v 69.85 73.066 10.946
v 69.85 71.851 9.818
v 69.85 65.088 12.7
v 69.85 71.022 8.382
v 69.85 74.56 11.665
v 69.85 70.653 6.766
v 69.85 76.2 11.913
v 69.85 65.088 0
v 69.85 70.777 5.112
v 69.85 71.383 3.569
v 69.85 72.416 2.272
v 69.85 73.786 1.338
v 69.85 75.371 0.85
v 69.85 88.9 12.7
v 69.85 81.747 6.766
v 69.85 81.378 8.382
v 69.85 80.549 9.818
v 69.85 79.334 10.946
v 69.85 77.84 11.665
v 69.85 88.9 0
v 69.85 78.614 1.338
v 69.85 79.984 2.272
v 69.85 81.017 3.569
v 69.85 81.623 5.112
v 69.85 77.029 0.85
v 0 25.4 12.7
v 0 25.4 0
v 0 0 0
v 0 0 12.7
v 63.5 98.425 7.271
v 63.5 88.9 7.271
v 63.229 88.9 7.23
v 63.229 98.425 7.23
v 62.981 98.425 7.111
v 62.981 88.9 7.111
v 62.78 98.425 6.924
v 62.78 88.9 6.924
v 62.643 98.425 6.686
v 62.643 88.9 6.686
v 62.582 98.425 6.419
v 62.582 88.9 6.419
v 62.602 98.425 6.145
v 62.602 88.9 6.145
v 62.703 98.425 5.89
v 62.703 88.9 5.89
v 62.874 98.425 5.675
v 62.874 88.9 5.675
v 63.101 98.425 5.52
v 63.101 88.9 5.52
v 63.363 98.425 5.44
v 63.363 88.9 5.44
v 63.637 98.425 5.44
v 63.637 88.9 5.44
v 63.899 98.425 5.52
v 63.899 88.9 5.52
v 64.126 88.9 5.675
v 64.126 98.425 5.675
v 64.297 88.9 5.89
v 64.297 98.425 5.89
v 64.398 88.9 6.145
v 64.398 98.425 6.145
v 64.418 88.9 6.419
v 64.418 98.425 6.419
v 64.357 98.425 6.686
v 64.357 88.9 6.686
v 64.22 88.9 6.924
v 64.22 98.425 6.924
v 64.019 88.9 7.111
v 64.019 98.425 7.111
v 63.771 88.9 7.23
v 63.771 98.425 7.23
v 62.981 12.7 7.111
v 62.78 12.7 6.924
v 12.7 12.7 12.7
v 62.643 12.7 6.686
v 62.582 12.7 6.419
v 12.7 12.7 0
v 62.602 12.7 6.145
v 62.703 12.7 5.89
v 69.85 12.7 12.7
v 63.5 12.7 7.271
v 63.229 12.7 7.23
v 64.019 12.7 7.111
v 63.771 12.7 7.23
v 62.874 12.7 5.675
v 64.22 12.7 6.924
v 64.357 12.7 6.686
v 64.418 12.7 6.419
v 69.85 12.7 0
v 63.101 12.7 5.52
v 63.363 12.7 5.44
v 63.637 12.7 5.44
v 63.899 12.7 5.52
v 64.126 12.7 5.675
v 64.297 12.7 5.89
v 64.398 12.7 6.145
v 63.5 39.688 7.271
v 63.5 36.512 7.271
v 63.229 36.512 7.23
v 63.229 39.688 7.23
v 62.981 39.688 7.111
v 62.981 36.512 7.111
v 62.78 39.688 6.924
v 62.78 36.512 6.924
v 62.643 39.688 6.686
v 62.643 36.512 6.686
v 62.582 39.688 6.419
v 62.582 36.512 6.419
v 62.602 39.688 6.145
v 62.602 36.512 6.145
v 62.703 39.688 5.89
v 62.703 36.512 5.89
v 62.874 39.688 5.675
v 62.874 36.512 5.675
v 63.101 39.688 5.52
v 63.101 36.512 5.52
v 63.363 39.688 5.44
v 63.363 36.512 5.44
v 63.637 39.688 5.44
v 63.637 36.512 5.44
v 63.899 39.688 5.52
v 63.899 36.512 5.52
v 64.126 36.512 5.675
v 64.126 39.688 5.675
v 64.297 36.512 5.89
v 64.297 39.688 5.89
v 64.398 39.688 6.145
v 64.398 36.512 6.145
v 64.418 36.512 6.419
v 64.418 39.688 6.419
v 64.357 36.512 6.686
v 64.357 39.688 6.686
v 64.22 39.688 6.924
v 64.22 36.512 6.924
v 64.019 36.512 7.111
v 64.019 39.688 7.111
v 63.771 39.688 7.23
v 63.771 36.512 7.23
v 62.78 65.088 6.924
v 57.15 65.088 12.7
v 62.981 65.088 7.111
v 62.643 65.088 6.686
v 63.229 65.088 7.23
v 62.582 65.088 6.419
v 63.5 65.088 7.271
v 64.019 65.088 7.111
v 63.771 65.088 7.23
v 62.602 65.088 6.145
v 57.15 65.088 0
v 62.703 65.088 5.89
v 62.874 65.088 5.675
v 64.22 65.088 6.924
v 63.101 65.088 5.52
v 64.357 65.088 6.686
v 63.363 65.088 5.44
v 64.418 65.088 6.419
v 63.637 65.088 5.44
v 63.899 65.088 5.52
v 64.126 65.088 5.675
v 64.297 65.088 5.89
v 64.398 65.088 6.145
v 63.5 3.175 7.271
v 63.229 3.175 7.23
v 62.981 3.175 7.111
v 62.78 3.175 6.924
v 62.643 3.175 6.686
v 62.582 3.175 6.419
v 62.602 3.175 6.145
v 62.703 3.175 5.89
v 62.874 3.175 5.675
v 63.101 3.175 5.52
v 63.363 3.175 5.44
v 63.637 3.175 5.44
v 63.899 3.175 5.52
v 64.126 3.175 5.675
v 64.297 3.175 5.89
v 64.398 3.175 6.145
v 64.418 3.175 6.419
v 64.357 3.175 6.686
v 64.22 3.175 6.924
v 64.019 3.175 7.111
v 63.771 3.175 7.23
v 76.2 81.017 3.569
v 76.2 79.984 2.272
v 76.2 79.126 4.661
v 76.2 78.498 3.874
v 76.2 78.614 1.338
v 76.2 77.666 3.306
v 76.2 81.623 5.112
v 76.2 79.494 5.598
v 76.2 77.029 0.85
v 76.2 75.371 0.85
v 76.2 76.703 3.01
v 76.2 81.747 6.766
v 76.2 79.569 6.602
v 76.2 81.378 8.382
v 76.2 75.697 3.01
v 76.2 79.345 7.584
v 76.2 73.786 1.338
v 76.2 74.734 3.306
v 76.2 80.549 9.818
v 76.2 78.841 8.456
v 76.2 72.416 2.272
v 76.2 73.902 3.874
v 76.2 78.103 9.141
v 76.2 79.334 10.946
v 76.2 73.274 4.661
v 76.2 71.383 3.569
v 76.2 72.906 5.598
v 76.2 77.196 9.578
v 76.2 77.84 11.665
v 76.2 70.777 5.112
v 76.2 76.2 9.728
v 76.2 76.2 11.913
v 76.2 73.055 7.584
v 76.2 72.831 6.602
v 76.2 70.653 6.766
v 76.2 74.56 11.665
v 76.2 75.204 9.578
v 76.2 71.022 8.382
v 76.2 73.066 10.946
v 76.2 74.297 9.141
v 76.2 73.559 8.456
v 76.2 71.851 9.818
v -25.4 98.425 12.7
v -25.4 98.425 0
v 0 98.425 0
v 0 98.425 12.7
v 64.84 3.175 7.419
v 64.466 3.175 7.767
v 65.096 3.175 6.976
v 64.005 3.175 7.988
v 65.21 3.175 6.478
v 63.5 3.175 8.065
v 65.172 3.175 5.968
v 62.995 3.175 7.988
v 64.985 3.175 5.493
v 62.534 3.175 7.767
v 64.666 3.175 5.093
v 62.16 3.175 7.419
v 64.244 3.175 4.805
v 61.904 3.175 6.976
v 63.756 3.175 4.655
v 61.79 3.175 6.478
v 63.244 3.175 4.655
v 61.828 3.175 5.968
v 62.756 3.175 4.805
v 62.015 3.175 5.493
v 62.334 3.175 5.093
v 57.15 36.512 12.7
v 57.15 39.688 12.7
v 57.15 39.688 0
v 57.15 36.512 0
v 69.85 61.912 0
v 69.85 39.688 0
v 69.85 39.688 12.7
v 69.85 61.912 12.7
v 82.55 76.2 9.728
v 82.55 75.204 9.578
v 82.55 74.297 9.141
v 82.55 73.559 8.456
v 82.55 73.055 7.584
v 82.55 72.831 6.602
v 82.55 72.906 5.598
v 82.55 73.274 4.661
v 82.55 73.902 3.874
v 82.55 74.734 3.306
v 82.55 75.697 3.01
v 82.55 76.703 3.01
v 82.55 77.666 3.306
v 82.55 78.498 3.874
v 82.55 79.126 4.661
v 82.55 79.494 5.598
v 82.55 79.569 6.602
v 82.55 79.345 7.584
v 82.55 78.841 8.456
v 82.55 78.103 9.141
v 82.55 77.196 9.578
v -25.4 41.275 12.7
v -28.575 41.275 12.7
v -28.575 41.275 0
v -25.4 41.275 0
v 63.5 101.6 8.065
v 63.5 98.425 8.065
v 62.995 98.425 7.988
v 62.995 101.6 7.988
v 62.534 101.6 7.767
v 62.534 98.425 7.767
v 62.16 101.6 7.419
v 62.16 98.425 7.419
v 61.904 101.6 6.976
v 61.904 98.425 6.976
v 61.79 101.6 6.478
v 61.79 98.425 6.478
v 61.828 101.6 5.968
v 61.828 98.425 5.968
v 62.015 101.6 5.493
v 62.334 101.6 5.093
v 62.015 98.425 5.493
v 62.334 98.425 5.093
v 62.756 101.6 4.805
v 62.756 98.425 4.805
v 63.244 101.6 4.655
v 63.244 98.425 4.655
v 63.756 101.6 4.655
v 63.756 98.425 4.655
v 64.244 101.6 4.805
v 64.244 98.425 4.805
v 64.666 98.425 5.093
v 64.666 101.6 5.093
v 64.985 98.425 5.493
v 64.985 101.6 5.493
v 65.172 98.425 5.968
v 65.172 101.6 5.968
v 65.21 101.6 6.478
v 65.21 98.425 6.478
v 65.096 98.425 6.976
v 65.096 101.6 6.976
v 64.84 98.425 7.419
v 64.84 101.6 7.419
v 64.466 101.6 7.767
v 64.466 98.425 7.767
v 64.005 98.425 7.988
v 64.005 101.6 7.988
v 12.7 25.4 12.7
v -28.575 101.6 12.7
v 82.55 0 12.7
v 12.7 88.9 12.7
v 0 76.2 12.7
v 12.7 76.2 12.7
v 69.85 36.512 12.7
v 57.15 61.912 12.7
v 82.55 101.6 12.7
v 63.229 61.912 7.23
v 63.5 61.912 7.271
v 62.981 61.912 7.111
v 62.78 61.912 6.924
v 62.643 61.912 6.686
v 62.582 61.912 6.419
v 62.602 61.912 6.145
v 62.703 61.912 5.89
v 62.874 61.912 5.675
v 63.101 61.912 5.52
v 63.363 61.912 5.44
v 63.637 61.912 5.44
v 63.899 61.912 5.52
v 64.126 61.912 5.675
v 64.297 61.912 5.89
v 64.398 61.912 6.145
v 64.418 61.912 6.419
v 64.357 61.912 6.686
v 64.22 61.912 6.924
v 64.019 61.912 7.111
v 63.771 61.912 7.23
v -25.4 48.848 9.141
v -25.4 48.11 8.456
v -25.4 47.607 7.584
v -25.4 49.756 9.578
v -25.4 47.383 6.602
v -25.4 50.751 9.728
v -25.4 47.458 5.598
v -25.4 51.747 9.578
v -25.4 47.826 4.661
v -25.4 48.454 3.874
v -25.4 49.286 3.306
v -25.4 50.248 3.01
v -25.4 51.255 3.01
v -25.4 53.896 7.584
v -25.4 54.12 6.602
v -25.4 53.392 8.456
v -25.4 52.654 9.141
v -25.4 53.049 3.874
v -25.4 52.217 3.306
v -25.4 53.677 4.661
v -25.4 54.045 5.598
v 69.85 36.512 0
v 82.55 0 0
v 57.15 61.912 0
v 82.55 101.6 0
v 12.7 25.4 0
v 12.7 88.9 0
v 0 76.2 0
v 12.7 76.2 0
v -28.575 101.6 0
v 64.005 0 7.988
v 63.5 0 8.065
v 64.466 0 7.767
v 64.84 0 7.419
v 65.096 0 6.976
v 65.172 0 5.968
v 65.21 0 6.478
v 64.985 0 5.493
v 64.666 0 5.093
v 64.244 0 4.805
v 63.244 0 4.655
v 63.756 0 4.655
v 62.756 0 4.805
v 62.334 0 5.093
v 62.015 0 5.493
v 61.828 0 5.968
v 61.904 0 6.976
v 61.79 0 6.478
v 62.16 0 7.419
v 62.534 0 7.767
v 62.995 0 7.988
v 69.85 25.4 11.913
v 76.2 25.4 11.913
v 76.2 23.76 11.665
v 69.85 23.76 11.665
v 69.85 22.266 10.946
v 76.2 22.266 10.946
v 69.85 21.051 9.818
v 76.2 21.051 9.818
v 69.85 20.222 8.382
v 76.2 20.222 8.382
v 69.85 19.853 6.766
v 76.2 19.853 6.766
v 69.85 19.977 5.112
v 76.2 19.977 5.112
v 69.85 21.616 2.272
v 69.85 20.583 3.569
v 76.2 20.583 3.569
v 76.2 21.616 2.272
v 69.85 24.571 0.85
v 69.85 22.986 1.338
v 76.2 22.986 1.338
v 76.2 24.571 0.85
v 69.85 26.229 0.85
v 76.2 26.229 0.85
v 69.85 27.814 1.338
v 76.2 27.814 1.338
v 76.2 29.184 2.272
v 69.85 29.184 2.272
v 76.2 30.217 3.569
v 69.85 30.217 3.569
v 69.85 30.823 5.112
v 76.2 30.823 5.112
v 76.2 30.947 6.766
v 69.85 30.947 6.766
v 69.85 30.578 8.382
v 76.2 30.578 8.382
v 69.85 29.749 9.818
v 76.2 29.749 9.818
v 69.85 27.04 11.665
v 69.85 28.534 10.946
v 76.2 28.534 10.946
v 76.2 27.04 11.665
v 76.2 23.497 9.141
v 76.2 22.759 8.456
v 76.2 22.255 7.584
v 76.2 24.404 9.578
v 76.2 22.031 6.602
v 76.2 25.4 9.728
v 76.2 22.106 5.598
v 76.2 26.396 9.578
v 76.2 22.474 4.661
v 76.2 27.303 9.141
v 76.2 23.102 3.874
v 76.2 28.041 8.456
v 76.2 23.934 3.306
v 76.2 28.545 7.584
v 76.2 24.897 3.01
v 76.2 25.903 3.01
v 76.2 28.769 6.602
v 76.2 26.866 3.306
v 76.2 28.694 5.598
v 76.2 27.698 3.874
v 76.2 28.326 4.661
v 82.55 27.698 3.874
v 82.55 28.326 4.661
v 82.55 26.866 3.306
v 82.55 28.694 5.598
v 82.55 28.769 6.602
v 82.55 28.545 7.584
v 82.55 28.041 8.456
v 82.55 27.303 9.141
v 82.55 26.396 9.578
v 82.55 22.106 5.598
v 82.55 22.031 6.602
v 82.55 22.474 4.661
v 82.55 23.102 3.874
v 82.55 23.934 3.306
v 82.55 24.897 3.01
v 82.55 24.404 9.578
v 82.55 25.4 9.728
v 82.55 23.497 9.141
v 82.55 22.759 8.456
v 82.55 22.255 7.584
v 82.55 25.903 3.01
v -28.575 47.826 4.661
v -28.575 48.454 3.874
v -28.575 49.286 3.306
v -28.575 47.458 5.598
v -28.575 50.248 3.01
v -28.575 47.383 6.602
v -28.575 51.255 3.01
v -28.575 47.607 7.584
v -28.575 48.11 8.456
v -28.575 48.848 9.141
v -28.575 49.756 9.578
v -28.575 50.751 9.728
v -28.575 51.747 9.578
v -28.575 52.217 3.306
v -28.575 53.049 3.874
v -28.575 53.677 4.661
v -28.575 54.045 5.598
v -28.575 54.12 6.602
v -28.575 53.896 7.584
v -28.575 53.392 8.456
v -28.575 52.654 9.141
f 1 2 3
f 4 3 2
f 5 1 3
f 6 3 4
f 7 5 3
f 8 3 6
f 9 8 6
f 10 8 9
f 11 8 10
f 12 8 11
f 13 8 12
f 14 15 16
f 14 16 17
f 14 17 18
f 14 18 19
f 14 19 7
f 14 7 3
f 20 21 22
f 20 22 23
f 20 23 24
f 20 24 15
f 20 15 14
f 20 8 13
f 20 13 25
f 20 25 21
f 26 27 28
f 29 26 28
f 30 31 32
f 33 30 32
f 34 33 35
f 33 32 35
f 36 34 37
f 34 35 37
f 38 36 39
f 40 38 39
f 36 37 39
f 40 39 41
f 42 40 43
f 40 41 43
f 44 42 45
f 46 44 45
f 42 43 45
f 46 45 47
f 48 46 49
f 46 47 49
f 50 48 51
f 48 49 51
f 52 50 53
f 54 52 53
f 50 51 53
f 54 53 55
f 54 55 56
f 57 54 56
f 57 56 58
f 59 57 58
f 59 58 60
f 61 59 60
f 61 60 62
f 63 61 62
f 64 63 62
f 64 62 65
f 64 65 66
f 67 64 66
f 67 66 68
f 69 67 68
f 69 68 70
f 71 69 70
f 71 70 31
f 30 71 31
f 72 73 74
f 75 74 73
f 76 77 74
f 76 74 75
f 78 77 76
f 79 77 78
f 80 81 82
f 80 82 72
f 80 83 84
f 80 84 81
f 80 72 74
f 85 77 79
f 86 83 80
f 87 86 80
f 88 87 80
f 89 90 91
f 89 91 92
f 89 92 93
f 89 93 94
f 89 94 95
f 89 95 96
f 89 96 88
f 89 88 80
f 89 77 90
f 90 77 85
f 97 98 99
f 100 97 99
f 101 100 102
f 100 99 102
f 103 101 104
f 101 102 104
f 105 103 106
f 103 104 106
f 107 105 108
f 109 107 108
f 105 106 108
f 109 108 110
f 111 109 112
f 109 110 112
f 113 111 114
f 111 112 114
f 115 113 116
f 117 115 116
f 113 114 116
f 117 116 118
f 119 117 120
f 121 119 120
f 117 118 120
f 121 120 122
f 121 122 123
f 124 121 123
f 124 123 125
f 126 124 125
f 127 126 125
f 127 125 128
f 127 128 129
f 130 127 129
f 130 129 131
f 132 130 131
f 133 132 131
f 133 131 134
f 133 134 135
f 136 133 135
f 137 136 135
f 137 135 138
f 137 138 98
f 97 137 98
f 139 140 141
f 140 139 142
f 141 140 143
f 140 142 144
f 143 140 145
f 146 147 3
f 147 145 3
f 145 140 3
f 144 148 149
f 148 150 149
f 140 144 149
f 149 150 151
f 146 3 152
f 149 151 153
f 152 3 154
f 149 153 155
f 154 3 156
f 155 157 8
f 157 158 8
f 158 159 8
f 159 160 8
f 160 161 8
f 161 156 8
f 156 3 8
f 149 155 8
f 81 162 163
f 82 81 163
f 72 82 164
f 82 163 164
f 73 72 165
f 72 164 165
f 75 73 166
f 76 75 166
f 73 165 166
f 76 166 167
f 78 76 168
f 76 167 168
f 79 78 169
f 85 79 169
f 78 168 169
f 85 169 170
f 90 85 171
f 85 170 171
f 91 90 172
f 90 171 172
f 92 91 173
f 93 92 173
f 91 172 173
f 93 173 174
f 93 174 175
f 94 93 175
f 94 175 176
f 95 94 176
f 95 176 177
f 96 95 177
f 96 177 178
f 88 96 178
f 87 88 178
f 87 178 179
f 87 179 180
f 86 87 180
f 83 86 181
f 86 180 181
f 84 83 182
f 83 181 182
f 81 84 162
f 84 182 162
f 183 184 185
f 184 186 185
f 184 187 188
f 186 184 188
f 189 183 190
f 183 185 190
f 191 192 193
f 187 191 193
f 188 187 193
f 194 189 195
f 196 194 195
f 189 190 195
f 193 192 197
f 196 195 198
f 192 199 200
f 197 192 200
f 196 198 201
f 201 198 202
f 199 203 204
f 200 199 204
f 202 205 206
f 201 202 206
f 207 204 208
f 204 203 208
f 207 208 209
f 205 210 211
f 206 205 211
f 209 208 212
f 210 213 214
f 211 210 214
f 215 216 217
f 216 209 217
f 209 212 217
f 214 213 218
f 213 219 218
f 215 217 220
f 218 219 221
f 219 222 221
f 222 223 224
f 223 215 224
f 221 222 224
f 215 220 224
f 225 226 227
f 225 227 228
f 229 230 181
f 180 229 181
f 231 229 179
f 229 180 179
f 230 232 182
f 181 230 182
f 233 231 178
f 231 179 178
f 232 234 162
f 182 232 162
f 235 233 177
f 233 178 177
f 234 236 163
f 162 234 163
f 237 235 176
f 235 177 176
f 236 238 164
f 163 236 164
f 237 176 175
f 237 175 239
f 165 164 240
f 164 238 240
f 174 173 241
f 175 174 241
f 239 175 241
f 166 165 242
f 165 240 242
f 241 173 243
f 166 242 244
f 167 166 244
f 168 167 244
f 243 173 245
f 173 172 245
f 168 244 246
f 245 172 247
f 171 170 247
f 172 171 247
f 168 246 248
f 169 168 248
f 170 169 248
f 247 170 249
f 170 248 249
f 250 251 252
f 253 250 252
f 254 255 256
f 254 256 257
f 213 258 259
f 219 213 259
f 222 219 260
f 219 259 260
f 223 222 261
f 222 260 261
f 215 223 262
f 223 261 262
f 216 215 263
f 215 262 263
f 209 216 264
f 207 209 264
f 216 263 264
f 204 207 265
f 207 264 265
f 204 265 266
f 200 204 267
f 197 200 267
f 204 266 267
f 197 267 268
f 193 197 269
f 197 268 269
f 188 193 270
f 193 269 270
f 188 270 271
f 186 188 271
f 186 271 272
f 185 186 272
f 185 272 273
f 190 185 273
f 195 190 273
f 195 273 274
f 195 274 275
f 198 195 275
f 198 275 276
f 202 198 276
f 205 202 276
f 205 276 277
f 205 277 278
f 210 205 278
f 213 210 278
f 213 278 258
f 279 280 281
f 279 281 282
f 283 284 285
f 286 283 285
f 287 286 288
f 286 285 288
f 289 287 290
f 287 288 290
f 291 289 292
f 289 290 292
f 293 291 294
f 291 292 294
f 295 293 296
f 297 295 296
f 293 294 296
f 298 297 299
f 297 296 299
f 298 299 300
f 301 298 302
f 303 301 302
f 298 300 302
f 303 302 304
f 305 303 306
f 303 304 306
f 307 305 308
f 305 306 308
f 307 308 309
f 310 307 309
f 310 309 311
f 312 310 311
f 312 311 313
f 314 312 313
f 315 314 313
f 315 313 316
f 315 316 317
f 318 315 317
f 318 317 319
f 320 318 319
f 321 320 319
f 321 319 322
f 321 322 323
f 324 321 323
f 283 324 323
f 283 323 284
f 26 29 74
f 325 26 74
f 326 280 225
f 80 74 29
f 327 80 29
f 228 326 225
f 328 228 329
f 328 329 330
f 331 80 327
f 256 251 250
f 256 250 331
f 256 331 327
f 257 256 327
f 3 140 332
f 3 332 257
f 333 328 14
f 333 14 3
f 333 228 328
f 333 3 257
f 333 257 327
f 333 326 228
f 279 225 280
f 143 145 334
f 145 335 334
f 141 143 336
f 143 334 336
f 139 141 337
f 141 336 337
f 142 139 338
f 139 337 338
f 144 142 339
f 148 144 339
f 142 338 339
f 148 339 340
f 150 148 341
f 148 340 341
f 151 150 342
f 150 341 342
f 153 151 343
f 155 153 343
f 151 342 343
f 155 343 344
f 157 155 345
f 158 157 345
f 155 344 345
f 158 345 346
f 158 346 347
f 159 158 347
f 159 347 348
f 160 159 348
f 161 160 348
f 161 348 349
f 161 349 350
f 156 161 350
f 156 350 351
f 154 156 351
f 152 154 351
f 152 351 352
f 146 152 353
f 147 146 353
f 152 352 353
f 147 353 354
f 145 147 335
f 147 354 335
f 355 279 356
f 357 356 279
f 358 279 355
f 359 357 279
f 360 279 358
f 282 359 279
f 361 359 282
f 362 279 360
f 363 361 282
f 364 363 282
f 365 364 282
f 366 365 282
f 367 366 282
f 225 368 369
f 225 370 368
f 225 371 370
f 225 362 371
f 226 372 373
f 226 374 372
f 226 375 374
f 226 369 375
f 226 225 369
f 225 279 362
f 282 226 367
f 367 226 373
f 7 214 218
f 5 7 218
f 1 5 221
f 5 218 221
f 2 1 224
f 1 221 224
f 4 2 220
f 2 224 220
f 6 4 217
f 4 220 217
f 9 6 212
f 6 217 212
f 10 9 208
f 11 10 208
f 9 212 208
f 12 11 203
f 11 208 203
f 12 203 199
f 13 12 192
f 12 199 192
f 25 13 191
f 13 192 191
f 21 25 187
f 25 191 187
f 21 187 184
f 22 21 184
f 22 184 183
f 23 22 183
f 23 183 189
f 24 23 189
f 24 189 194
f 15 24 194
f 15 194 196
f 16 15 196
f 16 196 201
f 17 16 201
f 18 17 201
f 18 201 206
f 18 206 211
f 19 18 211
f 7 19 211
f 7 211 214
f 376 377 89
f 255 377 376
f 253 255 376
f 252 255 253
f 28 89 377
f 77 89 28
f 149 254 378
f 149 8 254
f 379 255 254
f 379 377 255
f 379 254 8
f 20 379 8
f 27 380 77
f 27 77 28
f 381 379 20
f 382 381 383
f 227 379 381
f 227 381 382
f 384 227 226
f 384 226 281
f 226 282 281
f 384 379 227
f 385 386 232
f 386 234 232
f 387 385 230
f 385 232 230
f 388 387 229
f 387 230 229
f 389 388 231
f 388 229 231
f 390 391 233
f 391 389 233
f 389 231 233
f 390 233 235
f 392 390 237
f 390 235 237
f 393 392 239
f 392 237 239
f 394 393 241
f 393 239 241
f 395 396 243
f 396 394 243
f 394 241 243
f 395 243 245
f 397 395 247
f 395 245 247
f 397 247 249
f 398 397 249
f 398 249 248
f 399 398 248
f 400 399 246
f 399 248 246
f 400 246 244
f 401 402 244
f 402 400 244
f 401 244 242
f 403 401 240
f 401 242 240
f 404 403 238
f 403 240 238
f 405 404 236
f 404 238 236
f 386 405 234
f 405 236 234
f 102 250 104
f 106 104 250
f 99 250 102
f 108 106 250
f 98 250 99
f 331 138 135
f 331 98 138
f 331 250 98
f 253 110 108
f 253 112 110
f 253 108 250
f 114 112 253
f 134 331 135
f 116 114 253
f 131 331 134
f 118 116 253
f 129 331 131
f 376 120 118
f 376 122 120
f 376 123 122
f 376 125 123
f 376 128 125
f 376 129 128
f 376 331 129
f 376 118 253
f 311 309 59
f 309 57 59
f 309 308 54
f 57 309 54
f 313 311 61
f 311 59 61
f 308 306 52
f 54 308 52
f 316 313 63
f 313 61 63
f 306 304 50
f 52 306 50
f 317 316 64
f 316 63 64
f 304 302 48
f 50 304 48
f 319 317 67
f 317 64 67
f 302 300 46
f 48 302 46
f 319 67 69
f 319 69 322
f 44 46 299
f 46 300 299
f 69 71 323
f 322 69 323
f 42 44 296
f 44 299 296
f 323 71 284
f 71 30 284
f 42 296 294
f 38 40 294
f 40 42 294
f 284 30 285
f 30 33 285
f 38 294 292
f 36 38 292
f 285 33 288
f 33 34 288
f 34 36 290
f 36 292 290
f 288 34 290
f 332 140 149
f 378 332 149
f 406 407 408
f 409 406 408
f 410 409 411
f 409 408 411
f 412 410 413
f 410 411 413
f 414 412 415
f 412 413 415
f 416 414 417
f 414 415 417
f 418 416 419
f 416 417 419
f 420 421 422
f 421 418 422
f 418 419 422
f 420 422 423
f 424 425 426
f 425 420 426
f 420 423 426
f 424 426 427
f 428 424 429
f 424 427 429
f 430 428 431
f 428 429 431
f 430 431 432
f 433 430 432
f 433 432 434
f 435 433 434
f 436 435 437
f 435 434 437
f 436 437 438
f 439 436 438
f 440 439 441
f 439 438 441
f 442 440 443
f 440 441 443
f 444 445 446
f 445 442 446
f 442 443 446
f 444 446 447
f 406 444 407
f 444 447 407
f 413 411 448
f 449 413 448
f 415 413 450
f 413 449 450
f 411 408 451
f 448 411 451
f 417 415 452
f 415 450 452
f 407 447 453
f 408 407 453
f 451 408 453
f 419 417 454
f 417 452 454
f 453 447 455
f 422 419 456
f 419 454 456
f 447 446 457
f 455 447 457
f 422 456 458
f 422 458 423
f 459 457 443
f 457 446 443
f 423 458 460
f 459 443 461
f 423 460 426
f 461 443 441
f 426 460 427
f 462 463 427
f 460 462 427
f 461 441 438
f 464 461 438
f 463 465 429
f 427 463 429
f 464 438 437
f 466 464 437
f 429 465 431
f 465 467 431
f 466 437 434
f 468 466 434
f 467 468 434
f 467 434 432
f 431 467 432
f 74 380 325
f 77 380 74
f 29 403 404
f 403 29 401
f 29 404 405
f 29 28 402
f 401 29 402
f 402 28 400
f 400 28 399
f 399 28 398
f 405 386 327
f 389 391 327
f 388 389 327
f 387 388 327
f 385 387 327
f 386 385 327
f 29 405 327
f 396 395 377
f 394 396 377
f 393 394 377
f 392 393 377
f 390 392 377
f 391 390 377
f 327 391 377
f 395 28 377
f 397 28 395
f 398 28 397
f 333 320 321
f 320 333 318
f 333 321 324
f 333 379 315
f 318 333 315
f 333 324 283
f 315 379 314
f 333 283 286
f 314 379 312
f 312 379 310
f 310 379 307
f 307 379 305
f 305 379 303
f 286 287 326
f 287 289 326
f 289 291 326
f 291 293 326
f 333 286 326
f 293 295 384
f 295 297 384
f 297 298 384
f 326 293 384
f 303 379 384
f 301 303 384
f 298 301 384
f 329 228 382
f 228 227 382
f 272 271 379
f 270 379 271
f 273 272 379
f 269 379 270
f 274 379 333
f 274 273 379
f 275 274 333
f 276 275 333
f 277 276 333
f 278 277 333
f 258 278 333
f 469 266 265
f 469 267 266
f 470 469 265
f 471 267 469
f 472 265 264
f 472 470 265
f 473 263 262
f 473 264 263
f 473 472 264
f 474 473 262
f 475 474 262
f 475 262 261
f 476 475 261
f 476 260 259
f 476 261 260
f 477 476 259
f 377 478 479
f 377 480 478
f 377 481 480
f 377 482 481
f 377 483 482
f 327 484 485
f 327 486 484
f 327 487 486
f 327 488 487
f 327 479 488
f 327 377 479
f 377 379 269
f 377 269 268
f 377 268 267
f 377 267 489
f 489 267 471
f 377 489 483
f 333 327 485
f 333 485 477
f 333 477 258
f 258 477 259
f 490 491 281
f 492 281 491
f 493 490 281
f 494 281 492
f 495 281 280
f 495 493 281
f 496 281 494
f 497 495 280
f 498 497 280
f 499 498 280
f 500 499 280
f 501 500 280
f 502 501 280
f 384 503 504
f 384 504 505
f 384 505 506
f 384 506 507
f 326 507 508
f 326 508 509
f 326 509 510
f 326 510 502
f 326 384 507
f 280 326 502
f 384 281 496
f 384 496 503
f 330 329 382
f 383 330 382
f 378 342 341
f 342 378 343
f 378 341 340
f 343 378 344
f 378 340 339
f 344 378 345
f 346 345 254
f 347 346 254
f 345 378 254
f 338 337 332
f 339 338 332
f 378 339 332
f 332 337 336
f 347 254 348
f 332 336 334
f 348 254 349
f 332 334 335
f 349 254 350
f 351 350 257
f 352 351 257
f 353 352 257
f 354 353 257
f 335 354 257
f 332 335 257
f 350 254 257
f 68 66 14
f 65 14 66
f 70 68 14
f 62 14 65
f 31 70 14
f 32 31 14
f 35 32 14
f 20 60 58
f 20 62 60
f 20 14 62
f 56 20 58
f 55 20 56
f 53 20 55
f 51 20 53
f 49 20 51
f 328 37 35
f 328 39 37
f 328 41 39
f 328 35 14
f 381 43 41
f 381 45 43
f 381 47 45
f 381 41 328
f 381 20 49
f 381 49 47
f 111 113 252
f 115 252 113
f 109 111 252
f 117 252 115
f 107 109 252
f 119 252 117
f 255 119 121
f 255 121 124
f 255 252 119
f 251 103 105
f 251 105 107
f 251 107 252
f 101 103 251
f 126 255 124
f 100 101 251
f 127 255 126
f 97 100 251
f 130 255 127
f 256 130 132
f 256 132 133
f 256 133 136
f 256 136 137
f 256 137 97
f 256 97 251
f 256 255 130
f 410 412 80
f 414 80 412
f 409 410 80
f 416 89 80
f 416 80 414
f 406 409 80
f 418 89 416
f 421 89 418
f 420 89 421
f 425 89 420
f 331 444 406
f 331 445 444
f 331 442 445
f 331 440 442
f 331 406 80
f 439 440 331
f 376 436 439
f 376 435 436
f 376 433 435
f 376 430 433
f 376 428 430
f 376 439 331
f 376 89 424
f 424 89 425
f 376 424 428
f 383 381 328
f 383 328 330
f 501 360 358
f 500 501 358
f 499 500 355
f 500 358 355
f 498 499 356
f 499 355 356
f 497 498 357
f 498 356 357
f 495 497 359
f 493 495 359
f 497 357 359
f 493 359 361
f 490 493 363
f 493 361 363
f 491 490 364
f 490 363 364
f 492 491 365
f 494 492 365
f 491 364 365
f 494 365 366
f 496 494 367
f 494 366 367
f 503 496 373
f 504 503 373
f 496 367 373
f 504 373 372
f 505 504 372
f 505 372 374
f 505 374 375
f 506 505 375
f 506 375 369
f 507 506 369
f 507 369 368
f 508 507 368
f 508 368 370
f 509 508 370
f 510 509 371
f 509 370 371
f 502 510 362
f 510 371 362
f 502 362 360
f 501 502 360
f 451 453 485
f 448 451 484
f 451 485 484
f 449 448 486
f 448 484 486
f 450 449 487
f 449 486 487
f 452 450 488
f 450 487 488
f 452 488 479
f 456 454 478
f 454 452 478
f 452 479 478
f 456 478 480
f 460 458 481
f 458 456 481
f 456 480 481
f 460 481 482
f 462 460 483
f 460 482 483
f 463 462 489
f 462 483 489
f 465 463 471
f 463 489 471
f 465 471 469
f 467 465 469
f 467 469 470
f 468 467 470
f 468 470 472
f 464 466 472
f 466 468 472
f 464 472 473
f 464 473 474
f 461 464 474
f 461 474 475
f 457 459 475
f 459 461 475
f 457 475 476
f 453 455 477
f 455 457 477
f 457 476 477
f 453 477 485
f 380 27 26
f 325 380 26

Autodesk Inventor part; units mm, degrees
ref_plane "YZ Plane" through (0, 0, 0) normal (1, 0, 0) x (0, 1, 0)
ref_plane "XZ Plane" through (0, 0, 0) normal (0, 1, 0) x (-1, 0, 0)
ref_plane "XY Plane" through (0, 0, 0) normal (0, 0, 1) x (1, 0, 0)
sketch "Sketch1" plane through (0, 0, 0) normal (0, 0, 1) x (1, 0, 0)
  line L0 (0, 0) -> (152.4, 0)
  line L1 (152.4, 0) -> (152.4, 101.6)
  line L2 (152.4, 101.6) -> (0, 101.6)
  line L3 (0, 101.6) -> (0, 0)
  line L4 (0, 0) -> (12.7, 0)
  line L5 (12.7, 0) -> (12.7, 12.7)
  line L6 (12.7, 12.7) -> (139.7, 12.7)
  line L7 (139.7, 12.7) -> (139.7, 88.9)
  line L8 (139.7, 88.9) -> (12.7, 88.9)
  line L9 (12.7, 88.9) -> (12.7, 12.7)
  line L10 (69.85, 101.6) -> (82.55, 101.6)
  line L11 (82.55, 101.6) -> (82.55, 0)
  line L12 (82.55, 0) -> (69.85, 0)
  line L13 (69.85, 0) -> (69.85, 101.6)
  line L14 (69.85, 101.6) -> (82.55, 0) construction
  line L15 (82.55, 101.6) -> (69.85, 0) construction
  point P0 (76.2, 50.8)
  point P1 (82.55, 88.9)
  point P2 (82.55, 12.7)
  point P3 (69.85, 12.7)
  point P4 (69.85, 88.9)
  dimension "d0" = 152.4
  dimension "d1" = 101.6
  dimension "d2" = 12.7
  dimension "d3" = 12.7
  dimension "d4" = 127
  dimension "d5" = 76.2
  dimension "d6" = 12.7
extrude "Extrusion1" add sketch "Sketch1" along normal blind 12.7 contours L3 L2 L13 L8 L9 L5 L0 | L5 L6 L13 L0 | L13 L6 L11 L0 | L2 L11 L8 L13 | L11 L6 L7 L8 L2 L1 L0 | L13 L8 L11 L6
sketch "Sketch2" plane through (0, 101.6, 0) normal (0, 1, 0) x (1, 0, 0)
  line L0 (69.85, 0) -> (69.85, -12.7) projected
  line L1 (82.55, 0) -> (82.55, -12.7) projected
  line L2 (139.7, 0) -> (139.7, -12.7) projected
  line L3 (12.7, 0) -> (12.7, -12.7) projected
  line L4 (12.7, 0) -> (12.7, -12.7) projected
  line L5 (12.7, -6.35) -> (63.5, -6.35)
  line L6 (69.85, -6.35) -> (76.2, -6.35)
  point P0 (0, 0)
  dimension "d9" = 50.8
  dimension "d17" = 6.35
sketch "Sketch4" plane through (69.85, 12.7, 0) normal (1, 0, 0) x (0, 0, -1)
  line L0 (0, 76.2) -> (-12.7, 76.2) projected
  line L1 (-6.35, 76.2) -> (-6.35, 50.8)
  line L2 (-6.35, 76.2) -> (19.05, 76.2) construction
  line L3 (-6.35, 50.8) -> (-6.35, 25.4)
  line L4 (0, 0) -> (0, 76.2) projected
  line L5 (-12.7, 52.3875) -> (0, 52.3875)
  line L6 (0, 52.3875) -> (0, 49.2125)
  line L7 (0, 49.2125) -> (-12.7, 49.2125)
  line L8 (-12.7, 49.2125) -> (-12.7, 52.3875)
  line L9 (-12.7, 52.3875) -> (0, 49.2125) construction
  line L10 (0, 52.3875) -> (-12.7, 49.2125) construction
  line L11 (-12.7, 23.8125) -> (0, 23.8125)
  line L12 (0, 23.8125) -> (0, 26.9875)
  line L13 (0, 26.9875) -> (-12.7, 26.9875)
  line L14 (-12.7, 26.9875) -> (-12.7, 23.8125)
  line L15 (-12.7, 23.8125) -> (0, 26.9875) construction
  line L16 (0, 23.8125) -> (-12.7, 26.9875) construction
  point P0 (0, -12.7)
  dimension "d25" = 25.4
  dimension "d26" = 90
  dimension "d27" = 25.4
  dimension "d28" = 180
  dimension "d29" = 3.175
  dimension "d30" = 3.175
extrude "Extrusion2" add sketch "Sketch4" against normal blind 12.7 contours L4 L7 L3 L1 L5 | L1 L3 L7 L8 L5 | L4 L11 L14 L13
hole "Hole1" at (63.5, 101.6, 6.35) direction (0, -1, 0) diameter 1.8415 end through all both
hole "Hole2" at (63.5, 101.6, 6.35) direction (0, -1, 0) diameter 3.429 depth 3.175
ref_plane "Work Plane1" through (76.2, 101.6, 6.35) normal (1, 0, 0) x (0, 0, -1)
ref_plane "Work Plane2" through (76.2, 50.8, 0) normal (0, 1, 0) x (1, 0, 0)
mirror "Mirror1" about plane through (76.2, 101.6, 6.35) normal (1, 0, 0) of "Hole1", "Hole2", "Extrusion2"
mirror "Mirror2" about plane through (76.2, 50.8, 0) normal (0, 1, 0) of "Hole1", "Hole2", "Mirror1"
sketch "Sketch5" plane through (0, 0, 0) normal (-1, 0, 0) x (0, 0, 1)
  line L0 (12.7, 61.9125) -> (12.7, 39.6875) projected
  line L1 (12.7, 50.8) -> (12.7, 76.2)
  line L2 (12.7, 76.2) -> (0, 76.2)
  line L3 (0, 76.2) -> (0, 25.4)
  line L4 (0, 25.4) -> (12.7, 25.4)
  line L5 (12.7, 25.4) -> (12.7, 76.2)
  line L6 (4.6355, 101.6) -> (8.0645, 101.6) projected
  line L7 (6.35, 101.6) -> (6.35, 76.2)
  line L8 (6.35, 76.2) -> (6.35, 25.4)
  line L9 (0, 12.7) -> (12.7, 12.7) projected
  line L10 (0, 88.9) -> (0, 12.7) projected
  line L11 (12.7, 76.2) -> (0, 76.2)
  line L12 (0, 76.2) -> (0, 79.375)
  line L13 (0, 79.375) -> (12.7, 79.375)
  line L14 (12.7, 79.375) -> (12.7, 76.2)
  line L15 (0, 101.6) -> (12.7, 101.6) projected
  line L16 (0, 101.6) -> (0, 0) projected
  line L17 (12.7, 101.6) -> (0, 101.6)
  line L18 (0, 101.6) -> (0, 98.425)
  line L19 (0, 98.425) -> (12.7, 98.425)
  line L20 (12.7, 98.425) -> (12.7, 101.6)
  dimension "d33" = 25.4
  dimension "d34" = 50.8
  dimension "d35" = 25.4
  dimension "d36" = 50.8
  dimension "d37" = 180
  dimension "d45" = 3.175
  dimension "d62" = 3.175
hole "Hole3" [suppressed]
extrude "Extrusion3" cut sketch "Sketch5" against normal blind 12.7 contours L0 L5 L4 L8 L2 L1 | L8 L4 L3 L2
extrude "Extrusion4" add sketch "Sketch5" along normal blind 28.575 contours L19 L16 L15 L6 L7 | L7 L6 L15 L20 L19
sketch "Sketch6" plane through (12.7, 98.425, 0) normal (0, -1, 0) x (1, 0, 0)
  line L0 (-12.7, 12.7) -> (0, 12.7) projected
  line L1 (0, 0) -> (-12.7, 0) projected
  line L2 (-41.275, 12.7) -> (-38.1, 12.7)
  line L3 (-38.1, 12.7) -> (-38.1, 0)
  line L4 (-38.1, 0) -> (-41.275, 0)
  line L5 (-41.275, 0) -> (-41.275, 12.7)
  dimension "d50" = 3.175
extrude "Extrusion5" add sketch "Sketch6" along normal blind 57.15
sketch "Sketch7" plane through (-28.575, 0, 0) normal (-1, 0, 0) x (0, 0, 1)
  line L0 (12.7, 88.9) -> (12.7, 12.7) projected
  line L1 (12.7, 38.0513) -> (6.35, 38.0513)
  line L2 (5.4292, 36.5125) -> (5.4292, 39.6875) projected
  line L3 (6.35, 38.0513) -> (6.35, 50.7513)
  point P0 (0, 0)
  dimension "d53" = 6.35
  dimension "d54" = 12.7
hole "Hole4" at (-28.575, 50.7513, 6.35) direction (1, 0, 0) diameter 6.7564 depth 25.4 clearance for "Flat Head Machine Screw (82)" size "1/4" standard "Ansi Unified Screw Threads"
mirror "Mirror3" about plane through (76.2, 101.6, 6.35) normal (1, 0, 0) of "Extrusion3", "Extrusion4", "Extrusion5", "Hole4"
sketch "Sketch8" plane through (69.85, 88.9, 0) normal (-1, 0, 0) x (0, 0, 1)
  line L0 (12.7, 0) -> (12.7, -23.8125) projected
  line L1 (12.7, 0) -> (6.35, 0)
  line L2 (12.7, 0) -> (19.05, 0) construction
  line L3 (6.35, 0) -> (6.35, -12.7)
  point P0 (0, -88.9)
  dimension "d63" = 6.35
  dimension "d64" = 180
  dimension "d65" = 12.7
hole "Hole5" at (69.85, 76.2, 6.35) direction (1, 0, 0) diameter 6.7564 depth 25.4 counterbore diameter 11.1252 counterbore depth 6.35 clearance for "Socket Head Cap Screw" size "1/4" standard "Ansi Unified Screw Threads"
ref_plane "Work Plane3" through (82.55, 101.6, 6.35) normal (1, 0, 0) x (0, 0, -1)
split "Split1" plane through (82.55, 101.6, 6.35) removes the side toward (1, 0, 0)
mirror "Mirror4" about plane through (76.2, 50.8, 0) normal (0, 1, 0) of "Hole5"
properties part number "SampleHolder"
